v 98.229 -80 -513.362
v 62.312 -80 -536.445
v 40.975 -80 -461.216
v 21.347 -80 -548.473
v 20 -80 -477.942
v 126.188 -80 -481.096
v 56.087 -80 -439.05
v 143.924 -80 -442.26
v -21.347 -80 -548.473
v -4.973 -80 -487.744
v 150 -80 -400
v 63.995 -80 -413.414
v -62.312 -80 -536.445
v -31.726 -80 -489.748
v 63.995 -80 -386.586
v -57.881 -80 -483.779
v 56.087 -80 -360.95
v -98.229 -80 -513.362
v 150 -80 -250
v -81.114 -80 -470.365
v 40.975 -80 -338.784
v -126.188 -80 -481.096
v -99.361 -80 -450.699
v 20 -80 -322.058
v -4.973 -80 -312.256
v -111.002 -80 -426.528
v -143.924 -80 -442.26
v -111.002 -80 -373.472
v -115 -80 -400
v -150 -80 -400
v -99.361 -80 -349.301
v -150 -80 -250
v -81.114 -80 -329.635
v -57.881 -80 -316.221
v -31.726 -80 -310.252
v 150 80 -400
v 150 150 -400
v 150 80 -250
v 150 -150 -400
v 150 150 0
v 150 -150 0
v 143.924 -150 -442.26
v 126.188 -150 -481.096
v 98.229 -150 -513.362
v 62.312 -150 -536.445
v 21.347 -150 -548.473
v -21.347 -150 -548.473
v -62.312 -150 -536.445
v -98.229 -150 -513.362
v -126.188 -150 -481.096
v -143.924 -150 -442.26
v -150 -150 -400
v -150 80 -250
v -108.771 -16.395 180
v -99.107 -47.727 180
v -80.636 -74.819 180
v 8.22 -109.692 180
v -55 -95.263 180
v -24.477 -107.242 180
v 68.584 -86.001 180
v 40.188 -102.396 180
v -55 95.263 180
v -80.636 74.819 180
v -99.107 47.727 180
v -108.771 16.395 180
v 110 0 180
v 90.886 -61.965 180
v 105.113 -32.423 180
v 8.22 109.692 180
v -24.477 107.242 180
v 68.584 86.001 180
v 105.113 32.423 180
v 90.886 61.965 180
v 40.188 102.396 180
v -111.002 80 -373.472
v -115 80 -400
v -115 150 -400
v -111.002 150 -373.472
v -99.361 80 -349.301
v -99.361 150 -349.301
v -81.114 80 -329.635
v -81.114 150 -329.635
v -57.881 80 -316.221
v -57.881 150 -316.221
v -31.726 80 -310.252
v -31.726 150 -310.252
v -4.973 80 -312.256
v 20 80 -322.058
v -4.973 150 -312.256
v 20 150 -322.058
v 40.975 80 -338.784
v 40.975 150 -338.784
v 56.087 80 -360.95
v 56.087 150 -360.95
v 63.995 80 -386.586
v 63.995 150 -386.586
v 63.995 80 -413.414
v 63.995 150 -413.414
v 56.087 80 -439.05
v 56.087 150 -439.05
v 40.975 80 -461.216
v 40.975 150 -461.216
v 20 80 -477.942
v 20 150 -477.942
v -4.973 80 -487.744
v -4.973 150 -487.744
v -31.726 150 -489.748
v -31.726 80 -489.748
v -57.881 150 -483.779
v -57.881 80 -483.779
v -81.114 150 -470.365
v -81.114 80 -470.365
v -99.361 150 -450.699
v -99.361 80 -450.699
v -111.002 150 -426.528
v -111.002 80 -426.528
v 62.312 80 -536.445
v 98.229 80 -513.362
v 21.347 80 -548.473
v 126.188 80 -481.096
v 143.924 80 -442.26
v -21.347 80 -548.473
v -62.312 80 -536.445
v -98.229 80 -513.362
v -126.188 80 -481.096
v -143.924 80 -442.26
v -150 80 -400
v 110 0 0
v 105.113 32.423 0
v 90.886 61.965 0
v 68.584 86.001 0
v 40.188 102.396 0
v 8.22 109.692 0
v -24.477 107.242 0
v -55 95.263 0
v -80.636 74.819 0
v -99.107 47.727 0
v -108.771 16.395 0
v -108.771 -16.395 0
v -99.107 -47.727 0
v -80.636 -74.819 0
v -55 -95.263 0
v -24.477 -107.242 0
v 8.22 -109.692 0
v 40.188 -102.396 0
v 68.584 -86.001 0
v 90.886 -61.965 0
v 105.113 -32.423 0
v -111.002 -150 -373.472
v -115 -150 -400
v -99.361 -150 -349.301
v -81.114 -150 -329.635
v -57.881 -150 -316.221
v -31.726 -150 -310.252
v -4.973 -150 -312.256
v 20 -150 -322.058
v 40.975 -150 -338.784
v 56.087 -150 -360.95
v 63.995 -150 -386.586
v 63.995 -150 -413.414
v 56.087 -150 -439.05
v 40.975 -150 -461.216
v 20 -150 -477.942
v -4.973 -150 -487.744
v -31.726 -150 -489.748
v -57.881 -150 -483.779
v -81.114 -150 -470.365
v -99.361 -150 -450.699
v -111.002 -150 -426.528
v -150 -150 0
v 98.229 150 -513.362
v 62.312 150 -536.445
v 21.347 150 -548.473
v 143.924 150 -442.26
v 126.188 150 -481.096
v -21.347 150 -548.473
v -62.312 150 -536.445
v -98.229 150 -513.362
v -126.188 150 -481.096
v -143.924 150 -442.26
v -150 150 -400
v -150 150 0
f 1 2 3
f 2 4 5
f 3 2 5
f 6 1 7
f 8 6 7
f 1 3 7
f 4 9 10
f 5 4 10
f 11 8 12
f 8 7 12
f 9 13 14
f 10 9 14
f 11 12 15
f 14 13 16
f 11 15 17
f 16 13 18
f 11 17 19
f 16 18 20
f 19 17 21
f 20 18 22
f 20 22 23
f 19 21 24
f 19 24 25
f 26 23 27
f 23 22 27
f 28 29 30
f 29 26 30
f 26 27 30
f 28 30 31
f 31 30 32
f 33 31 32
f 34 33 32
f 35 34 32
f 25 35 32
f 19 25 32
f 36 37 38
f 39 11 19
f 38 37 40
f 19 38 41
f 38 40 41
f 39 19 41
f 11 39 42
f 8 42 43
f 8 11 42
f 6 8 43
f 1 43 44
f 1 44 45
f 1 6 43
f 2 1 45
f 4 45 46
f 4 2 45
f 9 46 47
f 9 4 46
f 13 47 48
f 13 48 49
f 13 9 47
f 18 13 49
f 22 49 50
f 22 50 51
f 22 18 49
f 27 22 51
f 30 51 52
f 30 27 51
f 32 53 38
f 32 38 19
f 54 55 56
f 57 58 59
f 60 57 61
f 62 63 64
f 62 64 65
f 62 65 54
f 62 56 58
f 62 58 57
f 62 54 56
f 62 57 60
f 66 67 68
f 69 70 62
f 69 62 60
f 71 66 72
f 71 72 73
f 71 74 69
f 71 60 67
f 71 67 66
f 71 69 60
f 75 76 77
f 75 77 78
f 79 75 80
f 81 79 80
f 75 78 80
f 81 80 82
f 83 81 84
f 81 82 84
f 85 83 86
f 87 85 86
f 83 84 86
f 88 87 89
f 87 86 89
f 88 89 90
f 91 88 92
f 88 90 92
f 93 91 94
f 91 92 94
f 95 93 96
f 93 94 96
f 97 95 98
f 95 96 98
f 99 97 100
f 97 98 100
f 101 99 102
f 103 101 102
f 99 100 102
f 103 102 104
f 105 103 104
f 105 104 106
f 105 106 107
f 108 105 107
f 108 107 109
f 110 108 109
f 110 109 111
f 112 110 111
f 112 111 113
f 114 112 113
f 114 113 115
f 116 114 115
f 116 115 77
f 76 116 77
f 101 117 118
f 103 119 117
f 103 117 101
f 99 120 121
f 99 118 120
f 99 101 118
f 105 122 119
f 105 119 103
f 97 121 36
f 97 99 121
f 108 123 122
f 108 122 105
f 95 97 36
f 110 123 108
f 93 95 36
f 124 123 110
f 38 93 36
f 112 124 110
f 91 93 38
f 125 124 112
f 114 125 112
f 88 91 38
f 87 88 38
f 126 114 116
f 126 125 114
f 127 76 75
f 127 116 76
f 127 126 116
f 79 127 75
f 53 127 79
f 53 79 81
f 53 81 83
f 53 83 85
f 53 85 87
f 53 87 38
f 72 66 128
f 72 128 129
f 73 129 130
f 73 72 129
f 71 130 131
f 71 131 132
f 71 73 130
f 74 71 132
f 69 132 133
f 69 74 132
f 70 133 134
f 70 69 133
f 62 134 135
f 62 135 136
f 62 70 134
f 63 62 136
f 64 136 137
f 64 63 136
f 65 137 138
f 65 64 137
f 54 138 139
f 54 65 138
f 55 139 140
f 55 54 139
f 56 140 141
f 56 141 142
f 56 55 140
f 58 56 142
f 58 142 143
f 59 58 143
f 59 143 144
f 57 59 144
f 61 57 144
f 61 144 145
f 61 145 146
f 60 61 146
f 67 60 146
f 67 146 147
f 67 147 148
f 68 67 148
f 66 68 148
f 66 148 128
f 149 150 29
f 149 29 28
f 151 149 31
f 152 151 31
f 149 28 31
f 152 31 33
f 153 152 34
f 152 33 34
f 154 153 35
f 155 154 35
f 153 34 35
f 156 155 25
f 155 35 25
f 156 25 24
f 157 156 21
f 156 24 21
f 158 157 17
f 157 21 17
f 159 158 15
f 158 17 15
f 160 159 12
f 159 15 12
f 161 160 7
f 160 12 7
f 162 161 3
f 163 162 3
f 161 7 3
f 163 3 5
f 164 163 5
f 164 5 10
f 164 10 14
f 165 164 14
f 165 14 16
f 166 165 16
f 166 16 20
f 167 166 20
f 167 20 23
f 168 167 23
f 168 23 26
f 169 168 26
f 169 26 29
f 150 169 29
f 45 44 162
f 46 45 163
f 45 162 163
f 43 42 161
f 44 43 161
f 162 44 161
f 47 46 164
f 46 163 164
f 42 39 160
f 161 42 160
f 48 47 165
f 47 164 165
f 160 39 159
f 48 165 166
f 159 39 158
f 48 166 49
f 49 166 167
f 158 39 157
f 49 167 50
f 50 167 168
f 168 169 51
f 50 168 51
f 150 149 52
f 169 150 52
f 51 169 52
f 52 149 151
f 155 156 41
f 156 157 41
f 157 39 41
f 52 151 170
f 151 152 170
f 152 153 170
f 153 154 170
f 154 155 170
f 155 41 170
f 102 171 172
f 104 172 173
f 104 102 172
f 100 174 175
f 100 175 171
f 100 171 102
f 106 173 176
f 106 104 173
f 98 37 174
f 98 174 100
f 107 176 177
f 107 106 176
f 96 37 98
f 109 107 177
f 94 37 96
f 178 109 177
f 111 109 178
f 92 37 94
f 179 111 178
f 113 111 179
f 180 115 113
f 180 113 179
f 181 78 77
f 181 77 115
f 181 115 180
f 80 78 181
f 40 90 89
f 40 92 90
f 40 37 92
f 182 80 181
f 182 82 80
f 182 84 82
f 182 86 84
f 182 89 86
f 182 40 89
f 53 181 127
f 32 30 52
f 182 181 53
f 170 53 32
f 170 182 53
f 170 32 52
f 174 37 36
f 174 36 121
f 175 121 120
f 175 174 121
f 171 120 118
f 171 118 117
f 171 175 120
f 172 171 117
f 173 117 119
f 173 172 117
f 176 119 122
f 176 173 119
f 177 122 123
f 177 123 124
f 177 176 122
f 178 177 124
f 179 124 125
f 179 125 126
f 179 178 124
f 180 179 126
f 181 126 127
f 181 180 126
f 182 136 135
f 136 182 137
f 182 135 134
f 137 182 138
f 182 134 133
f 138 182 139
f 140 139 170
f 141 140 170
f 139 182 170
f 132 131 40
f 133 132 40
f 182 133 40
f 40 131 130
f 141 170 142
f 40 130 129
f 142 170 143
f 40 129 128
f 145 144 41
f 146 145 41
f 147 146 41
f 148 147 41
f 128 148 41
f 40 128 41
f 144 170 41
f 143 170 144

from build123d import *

# Parameters (mm, degrees)
F0_R      = 90
F1_DEPTH  = 180
F2_W      = 300
F2_H      = 300
F3_DEPTH  = 400
F5_DEPTH  = 300
F6_R      = 90
F7_DEPTH  = 300
F8_W      = 160
F8_H      = 300
F9_DEPTH  = 303
F10_R     = 110
F11_DEPTH = 211


with BuildPart() as f1:
    # F0 (on Top) → F1 (new body)
    with BuildSketch(Plane.XY):
        Circle(F0_R)
    extrude(amount=F1_DEPTH)

    # F2 (on face) → F3 (join)
    with BuildSketch(Plane(origin=(0, 0, 0), x_dir=(1, 0, 0), z_dir=(0, 0, -1))):
        Rectangle(F2_W, F2_H)
    extrude(amount=F3_DEPTH)

    # F4 (on face) → F5 (join)
    with BuildSketch(Plane(origin=(0, 150, 0), x_dir=(-1, 0, 0), z_dir=(0, 1, 0))):
        with BuildLine():
            Line((150, -400), (-150, -400))
            ThreePointArc((-150, -400), (0, -550), (150, -400))
        make_face()
    extrude(amount=-F5_DEPTH)

    # F6 (on face) → F7 (cut)
    with BuildSketch(Plane(origin=(0, 150, 0), x_dir=(-1, 0, 0), z_dir=(0, 1, 0))):
        with Locations((25, -400)):
            Circle(F6_R)
    extrude(amount=-F7_DEPTH, mode=Mode.SUBTRACT)

    # F8 (on face) → F9 (cut)
    with BuildSketch(Plane(origin=(-150, 0, 0), x_dir=(0, -1, 0), z_dir=(-1, 0, 0))):
        with Locations((0, -400)):
            Rectangle(F8_W, F8_H)
    extrude(amount=-F9_DEPTH, mode=Mode.SUBTRACT)

    # F10 (on face) → F11 (join)
    with BuildSketch(Plane.XY.offset(180)):
        Circle(F10_R)
    extrude(amount=-F11_DEPTH)


solid = f1.part
